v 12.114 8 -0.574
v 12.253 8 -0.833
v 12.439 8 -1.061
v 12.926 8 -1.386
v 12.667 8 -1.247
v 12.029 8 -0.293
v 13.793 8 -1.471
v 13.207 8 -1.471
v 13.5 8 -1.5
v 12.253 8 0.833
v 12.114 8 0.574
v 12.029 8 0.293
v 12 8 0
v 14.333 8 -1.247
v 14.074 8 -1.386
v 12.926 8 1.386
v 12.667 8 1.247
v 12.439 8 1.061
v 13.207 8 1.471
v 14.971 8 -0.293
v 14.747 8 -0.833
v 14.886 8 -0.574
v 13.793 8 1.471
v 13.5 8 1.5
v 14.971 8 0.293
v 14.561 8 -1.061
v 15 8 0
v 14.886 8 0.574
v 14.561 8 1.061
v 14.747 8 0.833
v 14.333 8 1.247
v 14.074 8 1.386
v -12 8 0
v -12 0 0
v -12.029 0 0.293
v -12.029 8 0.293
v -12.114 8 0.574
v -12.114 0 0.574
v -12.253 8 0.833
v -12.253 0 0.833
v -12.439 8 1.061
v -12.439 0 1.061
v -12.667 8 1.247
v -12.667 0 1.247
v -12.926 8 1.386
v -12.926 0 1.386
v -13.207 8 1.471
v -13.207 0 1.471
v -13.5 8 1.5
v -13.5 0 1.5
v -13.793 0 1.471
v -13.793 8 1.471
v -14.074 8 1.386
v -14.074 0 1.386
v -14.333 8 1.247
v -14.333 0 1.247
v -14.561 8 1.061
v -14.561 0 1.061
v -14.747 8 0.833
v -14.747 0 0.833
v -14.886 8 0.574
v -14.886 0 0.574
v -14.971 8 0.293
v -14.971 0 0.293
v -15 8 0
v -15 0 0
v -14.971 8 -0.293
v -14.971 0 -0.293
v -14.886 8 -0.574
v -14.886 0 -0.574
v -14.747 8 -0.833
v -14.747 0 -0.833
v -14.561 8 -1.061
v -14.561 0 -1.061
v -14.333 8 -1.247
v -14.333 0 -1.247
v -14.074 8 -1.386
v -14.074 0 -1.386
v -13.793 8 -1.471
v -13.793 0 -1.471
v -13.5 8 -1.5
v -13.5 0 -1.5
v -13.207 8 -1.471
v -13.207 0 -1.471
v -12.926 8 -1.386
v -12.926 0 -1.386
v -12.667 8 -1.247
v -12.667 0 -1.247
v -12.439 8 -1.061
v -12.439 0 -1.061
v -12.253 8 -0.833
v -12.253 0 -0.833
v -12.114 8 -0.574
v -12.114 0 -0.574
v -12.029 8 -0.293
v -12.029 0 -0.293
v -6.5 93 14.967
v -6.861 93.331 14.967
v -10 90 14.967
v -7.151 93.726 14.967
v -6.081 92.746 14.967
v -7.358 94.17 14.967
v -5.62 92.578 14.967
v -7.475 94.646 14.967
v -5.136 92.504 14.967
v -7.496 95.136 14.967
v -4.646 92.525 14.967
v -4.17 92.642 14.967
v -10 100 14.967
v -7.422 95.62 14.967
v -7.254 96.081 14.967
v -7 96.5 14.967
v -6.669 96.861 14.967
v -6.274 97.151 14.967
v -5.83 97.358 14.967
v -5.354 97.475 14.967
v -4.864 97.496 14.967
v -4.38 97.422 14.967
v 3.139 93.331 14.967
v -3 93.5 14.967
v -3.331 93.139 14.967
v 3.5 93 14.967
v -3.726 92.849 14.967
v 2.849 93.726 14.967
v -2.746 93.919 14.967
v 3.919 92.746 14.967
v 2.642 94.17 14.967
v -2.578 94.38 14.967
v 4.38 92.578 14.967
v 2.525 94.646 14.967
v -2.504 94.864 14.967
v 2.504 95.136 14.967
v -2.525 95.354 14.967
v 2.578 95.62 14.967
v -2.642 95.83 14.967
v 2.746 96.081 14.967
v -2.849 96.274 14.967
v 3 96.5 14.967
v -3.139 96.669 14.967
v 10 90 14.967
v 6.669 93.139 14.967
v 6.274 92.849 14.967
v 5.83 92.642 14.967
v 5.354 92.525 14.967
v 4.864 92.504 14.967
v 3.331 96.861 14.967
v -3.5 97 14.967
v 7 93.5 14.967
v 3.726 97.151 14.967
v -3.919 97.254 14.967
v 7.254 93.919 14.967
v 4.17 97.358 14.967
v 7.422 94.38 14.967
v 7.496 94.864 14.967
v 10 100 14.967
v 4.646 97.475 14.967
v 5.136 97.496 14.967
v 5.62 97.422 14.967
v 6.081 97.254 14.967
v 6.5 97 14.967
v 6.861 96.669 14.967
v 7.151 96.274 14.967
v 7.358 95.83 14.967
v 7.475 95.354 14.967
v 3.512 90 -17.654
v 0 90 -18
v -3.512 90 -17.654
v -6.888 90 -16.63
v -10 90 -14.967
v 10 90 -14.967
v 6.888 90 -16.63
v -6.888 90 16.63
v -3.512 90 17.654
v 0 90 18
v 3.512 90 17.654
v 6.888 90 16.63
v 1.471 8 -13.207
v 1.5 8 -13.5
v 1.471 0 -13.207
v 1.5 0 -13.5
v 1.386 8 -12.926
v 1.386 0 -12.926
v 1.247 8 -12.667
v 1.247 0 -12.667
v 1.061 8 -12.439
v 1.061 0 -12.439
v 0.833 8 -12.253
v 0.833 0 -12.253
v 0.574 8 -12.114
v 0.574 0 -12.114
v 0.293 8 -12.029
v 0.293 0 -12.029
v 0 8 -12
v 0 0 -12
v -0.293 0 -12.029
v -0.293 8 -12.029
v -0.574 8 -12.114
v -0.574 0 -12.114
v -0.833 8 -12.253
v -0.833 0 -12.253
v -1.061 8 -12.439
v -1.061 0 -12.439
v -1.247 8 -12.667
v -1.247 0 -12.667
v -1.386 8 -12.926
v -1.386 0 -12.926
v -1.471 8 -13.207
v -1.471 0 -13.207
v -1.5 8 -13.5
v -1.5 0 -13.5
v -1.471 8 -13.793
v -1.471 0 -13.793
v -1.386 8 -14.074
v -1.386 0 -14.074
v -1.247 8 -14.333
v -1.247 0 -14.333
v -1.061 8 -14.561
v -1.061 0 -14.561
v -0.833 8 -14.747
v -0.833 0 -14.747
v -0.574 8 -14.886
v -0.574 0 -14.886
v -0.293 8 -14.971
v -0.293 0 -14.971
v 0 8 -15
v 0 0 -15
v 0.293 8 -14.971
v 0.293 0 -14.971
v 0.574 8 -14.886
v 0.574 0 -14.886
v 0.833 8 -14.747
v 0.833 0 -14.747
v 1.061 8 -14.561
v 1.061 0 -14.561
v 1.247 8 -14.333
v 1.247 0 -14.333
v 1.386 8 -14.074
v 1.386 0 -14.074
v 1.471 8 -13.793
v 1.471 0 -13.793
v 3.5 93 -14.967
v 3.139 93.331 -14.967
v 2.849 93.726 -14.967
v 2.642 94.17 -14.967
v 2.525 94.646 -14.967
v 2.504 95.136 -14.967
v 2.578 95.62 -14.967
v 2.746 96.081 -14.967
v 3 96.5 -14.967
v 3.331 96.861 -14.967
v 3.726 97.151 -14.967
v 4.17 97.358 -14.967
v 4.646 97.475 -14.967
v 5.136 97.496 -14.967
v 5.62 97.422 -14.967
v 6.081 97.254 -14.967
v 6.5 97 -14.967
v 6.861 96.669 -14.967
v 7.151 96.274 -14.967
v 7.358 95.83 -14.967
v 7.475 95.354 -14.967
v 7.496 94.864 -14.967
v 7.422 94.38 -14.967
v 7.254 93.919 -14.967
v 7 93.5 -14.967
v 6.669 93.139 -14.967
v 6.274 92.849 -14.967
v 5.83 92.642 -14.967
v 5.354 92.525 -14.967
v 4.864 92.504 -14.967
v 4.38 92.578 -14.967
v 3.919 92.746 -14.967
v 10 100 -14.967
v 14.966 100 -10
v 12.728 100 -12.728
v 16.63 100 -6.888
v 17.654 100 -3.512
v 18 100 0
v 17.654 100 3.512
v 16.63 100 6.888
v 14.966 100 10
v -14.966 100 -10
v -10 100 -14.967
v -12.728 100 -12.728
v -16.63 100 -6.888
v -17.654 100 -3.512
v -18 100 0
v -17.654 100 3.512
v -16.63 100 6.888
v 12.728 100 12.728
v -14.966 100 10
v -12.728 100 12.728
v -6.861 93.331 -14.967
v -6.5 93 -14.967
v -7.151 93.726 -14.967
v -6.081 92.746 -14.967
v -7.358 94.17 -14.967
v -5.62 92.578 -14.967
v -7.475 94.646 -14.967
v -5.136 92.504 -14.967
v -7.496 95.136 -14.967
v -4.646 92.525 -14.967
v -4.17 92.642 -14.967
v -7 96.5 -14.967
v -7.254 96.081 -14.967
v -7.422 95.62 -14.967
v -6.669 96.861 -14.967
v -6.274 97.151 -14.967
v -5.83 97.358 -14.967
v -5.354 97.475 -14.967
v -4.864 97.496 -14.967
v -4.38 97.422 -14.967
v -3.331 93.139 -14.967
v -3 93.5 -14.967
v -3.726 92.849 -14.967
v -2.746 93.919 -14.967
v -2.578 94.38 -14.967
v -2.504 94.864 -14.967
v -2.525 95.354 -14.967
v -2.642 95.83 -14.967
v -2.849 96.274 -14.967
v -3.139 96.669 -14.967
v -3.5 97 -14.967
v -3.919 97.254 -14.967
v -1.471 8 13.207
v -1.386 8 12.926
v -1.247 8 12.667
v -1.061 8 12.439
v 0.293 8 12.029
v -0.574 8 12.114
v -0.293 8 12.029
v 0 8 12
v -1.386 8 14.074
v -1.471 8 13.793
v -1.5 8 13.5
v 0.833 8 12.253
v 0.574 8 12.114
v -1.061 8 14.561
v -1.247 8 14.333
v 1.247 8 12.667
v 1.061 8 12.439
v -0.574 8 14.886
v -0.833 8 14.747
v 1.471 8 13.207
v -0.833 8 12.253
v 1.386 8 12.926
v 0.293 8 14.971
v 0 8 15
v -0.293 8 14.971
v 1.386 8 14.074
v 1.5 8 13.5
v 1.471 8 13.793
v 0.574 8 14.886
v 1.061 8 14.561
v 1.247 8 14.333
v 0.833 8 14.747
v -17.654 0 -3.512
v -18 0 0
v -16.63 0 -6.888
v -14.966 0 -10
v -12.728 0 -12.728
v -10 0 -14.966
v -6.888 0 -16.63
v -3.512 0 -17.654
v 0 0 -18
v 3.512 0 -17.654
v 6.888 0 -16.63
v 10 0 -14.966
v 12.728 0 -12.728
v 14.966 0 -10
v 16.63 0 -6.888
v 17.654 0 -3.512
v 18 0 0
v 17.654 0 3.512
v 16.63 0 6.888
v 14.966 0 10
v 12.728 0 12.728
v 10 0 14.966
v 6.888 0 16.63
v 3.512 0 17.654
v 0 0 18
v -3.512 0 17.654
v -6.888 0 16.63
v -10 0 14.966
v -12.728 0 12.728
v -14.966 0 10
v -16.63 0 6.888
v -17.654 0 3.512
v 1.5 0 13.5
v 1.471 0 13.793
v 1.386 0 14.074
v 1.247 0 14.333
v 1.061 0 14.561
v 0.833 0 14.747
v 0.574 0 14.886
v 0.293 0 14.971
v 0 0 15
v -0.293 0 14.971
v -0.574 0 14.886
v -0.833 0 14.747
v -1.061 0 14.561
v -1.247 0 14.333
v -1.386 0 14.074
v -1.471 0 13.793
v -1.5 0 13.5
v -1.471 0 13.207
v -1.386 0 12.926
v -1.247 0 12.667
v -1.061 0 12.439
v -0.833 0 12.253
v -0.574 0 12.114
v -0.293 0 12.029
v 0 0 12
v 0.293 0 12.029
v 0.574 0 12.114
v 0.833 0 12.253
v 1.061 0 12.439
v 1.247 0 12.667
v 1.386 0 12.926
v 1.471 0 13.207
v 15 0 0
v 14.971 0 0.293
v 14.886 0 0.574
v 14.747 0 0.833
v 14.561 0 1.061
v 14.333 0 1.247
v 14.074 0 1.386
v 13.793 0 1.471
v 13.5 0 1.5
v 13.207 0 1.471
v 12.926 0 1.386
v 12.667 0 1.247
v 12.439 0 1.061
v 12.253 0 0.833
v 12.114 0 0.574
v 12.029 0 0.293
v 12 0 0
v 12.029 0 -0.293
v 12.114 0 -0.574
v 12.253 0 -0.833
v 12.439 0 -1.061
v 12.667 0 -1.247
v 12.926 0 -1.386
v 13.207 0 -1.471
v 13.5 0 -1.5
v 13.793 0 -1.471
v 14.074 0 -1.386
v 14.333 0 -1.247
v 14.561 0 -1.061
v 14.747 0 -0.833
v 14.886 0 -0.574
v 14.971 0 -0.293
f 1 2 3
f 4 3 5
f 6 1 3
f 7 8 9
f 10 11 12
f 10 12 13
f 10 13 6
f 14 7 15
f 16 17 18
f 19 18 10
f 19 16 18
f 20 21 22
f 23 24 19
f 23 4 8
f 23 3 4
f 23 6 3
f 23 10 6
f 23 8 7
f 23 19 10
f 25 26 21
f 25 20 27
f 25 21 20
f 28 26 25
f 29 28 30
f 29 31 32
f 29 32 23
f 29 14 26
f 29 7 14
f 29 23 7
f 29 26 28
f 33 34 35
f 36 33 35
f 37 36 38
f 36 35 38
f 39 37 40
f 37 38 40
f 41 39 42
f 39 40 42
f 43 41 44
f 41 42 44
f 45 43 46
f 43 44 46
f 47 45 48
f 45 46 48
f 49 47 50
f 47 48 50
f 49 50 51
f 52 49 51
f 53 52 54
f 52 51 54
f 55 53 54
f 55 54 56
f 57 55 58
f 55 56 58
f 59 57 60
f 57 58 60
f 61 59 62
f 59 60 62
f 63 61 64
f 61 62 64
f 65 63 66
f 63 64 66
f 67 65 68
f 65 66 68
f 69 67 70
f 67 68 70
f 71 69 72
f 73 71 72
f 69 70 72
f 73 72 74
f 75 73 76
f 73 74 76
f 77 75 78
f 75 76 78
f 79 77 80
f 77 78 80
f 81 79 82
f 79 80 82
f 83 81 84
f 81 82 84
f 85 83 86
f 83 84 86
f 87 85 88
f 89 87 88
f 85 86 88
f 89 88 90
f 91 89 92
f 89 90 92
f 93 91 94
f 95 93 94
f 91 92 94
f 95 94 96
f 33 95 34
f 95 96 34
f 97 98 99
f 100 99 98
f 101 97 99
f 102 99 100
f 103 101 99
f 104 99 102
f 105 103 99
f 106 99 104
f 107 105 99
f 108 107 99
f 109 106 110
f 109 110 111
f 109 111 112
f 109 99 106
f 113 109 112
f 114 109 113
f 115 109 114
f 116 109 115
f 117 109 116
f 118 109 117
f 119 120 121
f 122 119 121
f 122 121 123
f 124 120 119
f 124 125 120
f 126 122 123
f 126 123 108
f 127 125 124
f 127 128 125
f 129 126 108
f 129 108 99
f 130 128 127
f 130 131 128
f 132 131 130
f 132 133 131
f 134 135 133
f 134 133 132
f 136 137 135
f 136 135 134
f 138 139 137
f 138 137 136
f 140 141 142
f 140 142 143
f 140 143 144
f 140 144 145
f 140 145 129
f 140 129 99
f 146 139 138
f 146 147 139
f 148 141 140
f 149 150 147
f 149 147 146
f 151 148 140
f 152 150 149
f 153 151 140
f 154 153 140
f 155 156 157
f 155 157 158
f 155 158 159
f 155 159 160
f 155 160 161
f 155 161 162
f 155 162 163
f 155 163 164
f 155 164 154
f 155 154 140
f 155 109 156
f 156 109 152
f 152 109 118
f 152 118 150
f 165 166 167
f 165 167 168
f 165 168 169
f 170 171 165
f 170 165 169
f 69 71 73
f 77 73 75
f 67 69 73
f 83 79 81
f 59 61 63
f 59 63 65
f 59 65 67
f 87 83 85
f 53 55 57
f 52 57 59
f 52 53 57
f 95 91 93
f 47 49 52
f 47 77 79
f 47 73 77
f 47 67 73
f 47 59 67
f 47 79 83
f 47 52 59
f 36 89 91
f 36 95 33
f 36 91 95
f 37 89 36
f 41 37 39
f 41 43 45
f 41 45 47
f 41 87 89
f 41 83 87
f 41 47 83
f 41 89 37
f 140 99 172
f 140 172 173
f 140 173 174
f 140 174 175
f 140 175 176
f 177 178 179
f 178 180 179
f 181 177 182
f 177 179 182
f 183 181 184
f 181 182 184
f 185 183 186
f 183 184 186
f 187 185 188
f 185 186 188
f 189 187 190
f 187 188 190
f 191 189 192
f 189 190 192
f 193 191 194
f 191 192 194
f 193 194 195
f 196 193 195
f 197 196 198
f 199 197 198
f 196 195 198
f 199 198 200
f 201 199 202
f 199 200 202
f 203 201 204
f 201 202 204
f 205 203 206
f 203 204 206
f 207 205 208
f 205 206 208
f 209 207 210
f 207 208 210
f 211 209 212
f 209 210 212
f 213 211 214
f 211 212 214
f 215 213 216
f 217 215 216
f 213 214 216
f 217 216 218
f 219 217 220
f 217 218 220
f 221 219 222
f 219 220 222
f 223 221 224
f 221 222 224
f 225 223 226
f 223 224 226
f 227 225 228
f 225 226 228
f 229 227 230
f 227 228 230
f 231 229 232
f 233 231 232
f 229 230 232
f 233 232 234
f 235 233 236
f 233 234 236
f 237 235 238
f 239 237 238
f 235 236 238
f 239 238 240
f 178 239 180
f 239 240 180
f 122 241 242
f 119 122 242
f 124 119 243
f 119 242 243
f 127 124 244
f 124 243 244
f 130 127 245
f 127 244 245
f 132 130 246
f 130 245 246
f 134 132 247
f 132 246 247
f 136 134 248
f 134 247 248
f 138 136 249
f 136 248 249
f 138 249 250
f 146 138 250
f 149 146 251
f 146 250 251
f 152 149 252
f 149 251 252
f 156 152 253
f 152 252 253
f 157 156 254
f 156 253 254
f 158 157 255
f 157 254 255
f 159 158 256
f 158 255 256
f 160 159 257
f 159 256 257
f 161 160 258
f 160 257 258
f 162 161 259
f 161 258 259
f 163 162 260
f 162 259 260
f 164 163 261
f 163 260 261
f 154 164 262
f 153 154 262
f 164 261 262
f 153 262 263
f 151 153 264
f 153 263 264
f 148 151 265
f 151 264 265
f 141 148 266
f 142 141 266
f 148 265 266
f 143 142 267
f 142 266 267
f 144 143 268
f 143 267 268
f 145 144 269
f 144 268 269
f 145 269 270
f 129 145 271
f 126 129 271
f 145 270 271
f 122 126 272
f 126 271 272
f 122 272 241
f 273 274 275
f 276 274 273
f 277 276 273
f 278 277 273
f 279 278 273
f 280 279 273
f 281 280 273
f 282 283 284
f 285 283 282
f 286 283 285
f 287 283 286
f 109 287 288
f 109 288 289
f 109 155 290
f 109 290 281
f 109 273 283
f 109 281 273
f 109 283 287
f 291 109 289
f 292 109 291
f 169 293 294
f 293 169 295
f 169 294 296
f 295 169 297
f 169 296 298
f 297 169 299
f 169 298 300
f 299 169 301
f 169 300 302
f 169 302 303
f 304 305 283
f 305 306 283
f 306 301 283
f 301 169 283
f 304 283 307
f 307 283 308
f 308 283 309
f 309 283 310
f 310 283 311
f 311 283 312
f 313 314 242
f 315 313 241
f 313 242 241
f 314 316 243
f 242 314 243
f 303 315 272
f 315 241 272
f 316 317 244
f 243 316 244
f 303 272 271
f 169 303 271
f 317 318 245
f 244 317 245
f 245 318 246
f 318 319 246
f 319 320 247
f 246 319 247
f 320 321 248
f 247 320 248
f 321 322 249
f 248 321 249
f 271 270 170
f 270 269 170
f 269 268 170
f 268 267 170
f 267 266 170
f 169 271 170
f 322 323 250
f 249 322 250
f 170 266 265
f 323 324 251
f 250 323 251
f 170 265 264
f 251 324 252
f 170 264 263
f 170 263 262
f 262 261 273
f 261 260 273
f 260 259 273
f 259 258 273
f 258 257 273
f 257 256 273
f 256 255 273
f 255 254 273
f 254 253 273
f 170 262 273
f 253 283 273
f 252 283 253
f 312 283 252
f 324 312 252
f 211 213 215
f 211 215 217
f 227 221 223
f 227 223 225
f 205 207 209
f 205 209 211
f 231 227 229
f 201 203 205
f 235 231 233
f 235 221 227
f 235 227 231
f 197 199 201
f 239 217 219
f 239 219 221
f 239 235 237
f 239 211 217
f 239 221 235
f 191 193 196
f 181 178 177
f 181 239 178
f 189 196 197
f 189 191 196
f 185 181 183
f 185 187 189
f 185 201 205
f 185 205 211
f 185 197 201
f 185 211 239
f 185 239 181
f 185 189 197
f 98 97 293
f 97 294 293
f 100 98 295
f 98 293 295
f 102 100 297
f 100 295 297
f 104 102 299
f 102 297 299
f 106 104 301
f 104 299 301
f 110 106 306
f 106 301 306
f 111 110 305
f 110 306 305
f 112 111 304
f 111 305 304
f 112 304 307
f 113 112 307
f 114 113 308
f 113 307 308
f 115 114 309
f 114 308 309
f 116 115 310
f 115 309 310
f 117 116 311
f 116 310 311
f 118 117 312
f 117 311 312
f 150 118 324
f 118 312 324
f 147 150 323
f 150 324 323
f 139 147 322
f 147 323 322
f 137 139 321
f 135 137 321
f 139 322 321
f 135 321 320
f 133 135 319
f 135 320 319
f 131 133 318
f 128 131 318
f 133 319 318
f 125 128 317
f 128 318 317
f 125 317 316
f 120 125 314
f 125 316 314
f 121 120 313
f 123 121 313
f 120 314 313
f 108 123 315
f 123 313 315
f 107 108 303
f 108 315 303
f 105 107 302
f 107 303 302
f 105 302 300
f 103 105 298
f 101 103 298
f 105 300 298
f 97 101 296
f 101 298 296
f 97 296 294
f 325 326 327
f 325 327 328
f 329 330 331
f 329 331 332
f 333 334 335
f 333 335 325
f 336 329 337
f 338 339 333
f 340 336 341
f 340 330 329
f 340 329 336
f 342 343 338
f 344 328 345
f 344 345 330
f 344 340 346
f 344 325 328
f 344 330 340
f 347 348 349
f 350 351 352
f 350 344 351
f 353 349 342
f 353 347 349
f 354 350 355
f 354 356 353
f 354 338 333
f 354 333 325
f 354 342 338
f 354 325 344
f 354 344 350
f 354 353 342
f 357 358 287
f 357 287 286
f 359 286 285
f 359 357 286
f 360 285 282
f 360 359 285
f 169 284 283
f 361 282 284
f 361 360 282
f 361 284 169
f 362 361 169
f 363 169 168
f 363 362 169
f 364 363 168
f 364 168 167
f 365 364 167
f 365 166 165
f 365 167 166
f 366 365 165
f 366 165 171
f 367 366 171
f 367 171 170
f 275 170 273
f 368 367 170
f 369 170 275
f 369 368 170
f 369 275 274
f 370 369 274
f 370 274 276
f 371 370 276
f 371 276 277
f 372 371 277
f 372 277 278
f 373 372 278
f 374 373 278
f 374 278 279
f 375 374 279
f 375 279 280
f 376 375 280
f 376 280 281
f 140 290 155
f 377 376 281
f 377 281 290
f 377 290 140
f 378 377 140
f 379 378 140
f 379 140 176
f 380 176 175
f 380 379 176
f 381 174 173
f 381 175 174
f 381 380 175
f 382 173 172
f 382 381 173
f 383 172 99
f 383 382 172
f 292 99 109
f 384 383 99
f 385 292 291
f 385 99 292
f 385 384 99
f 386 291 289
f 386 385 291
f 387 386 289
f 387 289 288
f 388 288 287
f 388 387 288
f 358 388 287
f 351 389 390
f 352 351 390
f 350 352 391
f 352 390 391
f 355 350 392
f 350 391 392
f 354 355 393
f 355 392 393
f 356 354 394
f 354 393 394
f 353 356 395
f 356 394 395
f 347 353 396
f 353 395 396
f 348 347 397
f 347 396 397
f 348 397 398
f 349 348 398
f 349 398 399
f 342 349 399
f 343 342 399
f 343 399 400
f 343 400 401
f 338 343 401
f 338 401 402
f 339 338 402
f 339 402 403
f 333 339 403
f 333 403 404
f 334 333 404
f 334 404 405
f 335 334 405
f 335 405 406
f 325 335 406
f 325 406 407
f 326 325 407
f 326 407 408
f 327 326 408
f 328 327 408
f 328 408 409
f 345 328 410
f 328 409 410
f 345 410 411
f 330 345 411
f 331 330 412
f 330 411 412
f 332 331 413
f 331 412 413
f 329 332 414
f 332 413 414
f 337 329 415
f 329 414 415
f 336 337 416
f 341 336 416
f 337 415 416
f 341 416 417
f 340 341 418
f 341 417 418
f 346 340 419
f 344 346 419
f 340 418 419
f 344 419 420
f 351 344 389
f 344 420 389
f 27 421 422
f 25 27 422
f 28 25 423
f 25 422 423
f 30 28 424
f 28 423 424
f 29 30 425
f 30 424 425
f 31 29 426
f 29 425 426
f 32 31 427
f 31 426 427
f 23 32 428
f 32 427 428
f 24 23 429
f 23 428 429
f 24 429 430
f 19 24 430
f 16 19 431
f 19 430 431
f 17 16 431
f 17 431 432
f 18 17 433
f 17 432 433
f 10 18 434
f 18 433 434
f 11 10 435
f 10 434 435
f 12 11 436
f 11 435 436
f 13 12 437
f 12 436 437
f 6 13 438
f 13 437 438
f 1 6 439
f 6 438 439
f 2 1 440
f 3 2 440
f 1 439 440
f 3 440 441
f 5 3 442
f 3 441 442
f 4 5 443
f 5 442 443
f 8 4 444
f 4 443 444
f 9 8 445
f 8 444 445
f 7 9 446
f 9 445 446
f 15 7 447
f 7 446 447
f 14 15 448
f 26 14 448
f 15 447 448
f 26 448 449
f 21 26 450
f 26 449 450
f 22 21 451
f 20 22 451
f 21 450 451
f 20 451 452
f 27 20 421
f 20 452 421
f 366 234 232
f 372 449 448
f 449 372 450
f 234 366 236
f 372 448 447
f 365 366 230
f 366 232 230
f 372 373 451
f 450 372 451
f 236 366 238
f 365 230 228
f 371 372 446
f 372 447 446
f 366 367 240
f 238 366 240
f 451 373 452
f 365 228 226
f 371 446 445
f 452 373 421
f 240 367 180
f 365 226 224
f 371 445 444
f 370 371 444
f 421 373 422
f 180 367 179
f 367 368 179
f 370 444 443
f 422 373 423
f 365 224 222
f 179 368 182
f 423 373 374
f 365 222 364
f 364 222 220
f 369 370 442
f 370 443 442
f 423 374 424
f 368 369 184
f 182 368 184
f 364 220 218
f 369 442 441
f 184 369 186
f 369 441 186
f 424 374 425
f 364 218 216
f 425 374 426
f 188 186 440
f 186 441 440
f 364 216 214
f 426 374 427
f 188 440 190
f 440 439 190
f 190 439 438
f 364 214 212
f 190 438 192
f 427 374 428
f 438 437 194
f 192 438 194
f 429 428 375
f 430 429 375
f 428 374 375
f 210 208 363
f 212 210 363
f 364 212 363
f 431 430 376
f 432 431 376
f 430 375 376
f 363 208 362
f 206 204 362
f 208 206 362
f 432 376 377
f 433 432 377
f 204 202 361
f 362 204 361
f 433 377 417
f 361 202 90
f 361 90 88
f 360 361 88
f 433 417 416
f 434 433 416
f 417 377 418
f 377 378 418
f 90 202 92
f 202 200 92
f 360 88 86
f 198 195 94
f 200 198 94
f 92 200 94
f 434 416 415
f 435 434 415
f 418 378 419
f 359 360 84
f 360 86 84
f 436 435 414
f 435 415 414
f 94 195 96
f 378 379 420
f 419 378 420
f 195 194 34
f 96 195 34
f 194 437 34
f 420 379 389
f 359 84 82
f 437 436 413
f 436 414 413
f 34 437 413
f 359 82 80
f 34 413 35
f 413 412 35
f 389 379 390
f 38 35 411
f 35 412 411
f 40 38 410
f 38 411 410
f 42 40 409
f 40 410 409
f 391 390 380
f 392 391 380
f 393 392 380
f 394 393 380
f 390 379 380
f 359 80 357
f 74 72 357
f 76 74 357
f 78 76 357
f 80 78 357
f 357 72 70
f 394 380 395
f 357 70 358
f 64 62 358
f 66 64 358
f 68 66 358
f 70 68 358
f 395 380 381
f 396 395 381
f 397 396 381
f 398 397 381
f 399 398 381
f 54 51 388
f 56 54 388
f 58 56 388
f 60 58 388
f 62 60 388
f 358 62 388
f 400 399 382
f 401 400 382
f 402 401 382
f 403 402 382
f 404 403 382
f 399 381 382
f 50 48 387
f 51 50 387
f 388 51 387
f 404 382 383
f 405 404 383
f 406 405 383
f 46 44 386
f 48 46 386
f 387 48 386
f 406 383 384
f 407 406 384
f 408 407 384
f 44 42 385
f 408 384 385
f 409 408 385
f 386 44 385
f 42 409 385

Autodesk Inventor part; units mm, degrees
ref_plane "YZ Plane" through (0, 0, 0) normal (1, 0, 0) x (0, 1, 0)
ref_plane "XZ Plane" through (0, 0, 0) normal (0, 1, 0) x (-1, 0, 0)
ref_plane "XY Plane" through (0, 0, 0) normal (0, 0, 1) x (1, 0, 0)
sketch "Sketch1" plane through (0, 0, 0) normal (0, 1, 0) x (-1, 0, 0)
  circle A0 centre (0, 0) radius 18
  dimension "d0" = 36
extrude "Extrusion1" add sketch "Sketch1" along normal blind 100
sketch "Sketch3" plane through (0, 100, 0) normal (0, 1, 0) x (1, 0, 0)
  circle A0 centre (0, 0) radius 18 projected
  line L0 (-10, 14.9666) -> (10, 14.9666)
  circle A1 centre (0, 0) radius 18 projected
  line L1 (0, 0) -> (10, 0)
  line L2 (-10, -14.9666) -> (10, -14.9666)
  point P0 (0, 14.9666)
  point P1 (10, 14.9666)
  point P2 (10, -14.9666)
  dimension "d6" = 20
extrude "Extrusion3" cut sketch "Sketch3" against normal blind 10 contours L0 A0 | A0 L2
sketch "Sketch4" plane through (10, 100, -14.9666) normal (0, 0, -1) x (-1, 0, 0)
  arc A0 (6.5, -7) -> (3.5, -7) centre (5, -5) ccw projected
  arc A1 (16.5, -7) -> (13.5, -7) centre (15, -5) ccw projected
  circle A2 centre (5, -5) radius 2.5
  circle A3 centre (15, -5) radius 2.5
  point P0 (10, -100)
  point P1 (3.5, -7)
  point P2 (6.5, -7)
  point P3 (13.5, -7)
  point P4 (16.5, -7)
extrude "Extrusion4" cut sketch "Sketch4" against normal through all
sketch "Sketch5" plane through (0, 0, 0) normal (0, -1, 0) x (1, 0, 0)
  circle A0 centre (13.5, 0) radius 1.5
  circle A1 centre (0, 13.5) radius 1.5
  circle A2 centre (-13.5, 0) radius 1.5
  circle A3 centre (0, -13.5) radius 1.5
  point P0 (0, 0)
  dimension "d11" = 3
  dimension "d12" = 13.5
  dimension "d15" = 360
extrude "Extrusion5" cut sketch "Sketch5" against normal blind 8
properties part number "link1"
